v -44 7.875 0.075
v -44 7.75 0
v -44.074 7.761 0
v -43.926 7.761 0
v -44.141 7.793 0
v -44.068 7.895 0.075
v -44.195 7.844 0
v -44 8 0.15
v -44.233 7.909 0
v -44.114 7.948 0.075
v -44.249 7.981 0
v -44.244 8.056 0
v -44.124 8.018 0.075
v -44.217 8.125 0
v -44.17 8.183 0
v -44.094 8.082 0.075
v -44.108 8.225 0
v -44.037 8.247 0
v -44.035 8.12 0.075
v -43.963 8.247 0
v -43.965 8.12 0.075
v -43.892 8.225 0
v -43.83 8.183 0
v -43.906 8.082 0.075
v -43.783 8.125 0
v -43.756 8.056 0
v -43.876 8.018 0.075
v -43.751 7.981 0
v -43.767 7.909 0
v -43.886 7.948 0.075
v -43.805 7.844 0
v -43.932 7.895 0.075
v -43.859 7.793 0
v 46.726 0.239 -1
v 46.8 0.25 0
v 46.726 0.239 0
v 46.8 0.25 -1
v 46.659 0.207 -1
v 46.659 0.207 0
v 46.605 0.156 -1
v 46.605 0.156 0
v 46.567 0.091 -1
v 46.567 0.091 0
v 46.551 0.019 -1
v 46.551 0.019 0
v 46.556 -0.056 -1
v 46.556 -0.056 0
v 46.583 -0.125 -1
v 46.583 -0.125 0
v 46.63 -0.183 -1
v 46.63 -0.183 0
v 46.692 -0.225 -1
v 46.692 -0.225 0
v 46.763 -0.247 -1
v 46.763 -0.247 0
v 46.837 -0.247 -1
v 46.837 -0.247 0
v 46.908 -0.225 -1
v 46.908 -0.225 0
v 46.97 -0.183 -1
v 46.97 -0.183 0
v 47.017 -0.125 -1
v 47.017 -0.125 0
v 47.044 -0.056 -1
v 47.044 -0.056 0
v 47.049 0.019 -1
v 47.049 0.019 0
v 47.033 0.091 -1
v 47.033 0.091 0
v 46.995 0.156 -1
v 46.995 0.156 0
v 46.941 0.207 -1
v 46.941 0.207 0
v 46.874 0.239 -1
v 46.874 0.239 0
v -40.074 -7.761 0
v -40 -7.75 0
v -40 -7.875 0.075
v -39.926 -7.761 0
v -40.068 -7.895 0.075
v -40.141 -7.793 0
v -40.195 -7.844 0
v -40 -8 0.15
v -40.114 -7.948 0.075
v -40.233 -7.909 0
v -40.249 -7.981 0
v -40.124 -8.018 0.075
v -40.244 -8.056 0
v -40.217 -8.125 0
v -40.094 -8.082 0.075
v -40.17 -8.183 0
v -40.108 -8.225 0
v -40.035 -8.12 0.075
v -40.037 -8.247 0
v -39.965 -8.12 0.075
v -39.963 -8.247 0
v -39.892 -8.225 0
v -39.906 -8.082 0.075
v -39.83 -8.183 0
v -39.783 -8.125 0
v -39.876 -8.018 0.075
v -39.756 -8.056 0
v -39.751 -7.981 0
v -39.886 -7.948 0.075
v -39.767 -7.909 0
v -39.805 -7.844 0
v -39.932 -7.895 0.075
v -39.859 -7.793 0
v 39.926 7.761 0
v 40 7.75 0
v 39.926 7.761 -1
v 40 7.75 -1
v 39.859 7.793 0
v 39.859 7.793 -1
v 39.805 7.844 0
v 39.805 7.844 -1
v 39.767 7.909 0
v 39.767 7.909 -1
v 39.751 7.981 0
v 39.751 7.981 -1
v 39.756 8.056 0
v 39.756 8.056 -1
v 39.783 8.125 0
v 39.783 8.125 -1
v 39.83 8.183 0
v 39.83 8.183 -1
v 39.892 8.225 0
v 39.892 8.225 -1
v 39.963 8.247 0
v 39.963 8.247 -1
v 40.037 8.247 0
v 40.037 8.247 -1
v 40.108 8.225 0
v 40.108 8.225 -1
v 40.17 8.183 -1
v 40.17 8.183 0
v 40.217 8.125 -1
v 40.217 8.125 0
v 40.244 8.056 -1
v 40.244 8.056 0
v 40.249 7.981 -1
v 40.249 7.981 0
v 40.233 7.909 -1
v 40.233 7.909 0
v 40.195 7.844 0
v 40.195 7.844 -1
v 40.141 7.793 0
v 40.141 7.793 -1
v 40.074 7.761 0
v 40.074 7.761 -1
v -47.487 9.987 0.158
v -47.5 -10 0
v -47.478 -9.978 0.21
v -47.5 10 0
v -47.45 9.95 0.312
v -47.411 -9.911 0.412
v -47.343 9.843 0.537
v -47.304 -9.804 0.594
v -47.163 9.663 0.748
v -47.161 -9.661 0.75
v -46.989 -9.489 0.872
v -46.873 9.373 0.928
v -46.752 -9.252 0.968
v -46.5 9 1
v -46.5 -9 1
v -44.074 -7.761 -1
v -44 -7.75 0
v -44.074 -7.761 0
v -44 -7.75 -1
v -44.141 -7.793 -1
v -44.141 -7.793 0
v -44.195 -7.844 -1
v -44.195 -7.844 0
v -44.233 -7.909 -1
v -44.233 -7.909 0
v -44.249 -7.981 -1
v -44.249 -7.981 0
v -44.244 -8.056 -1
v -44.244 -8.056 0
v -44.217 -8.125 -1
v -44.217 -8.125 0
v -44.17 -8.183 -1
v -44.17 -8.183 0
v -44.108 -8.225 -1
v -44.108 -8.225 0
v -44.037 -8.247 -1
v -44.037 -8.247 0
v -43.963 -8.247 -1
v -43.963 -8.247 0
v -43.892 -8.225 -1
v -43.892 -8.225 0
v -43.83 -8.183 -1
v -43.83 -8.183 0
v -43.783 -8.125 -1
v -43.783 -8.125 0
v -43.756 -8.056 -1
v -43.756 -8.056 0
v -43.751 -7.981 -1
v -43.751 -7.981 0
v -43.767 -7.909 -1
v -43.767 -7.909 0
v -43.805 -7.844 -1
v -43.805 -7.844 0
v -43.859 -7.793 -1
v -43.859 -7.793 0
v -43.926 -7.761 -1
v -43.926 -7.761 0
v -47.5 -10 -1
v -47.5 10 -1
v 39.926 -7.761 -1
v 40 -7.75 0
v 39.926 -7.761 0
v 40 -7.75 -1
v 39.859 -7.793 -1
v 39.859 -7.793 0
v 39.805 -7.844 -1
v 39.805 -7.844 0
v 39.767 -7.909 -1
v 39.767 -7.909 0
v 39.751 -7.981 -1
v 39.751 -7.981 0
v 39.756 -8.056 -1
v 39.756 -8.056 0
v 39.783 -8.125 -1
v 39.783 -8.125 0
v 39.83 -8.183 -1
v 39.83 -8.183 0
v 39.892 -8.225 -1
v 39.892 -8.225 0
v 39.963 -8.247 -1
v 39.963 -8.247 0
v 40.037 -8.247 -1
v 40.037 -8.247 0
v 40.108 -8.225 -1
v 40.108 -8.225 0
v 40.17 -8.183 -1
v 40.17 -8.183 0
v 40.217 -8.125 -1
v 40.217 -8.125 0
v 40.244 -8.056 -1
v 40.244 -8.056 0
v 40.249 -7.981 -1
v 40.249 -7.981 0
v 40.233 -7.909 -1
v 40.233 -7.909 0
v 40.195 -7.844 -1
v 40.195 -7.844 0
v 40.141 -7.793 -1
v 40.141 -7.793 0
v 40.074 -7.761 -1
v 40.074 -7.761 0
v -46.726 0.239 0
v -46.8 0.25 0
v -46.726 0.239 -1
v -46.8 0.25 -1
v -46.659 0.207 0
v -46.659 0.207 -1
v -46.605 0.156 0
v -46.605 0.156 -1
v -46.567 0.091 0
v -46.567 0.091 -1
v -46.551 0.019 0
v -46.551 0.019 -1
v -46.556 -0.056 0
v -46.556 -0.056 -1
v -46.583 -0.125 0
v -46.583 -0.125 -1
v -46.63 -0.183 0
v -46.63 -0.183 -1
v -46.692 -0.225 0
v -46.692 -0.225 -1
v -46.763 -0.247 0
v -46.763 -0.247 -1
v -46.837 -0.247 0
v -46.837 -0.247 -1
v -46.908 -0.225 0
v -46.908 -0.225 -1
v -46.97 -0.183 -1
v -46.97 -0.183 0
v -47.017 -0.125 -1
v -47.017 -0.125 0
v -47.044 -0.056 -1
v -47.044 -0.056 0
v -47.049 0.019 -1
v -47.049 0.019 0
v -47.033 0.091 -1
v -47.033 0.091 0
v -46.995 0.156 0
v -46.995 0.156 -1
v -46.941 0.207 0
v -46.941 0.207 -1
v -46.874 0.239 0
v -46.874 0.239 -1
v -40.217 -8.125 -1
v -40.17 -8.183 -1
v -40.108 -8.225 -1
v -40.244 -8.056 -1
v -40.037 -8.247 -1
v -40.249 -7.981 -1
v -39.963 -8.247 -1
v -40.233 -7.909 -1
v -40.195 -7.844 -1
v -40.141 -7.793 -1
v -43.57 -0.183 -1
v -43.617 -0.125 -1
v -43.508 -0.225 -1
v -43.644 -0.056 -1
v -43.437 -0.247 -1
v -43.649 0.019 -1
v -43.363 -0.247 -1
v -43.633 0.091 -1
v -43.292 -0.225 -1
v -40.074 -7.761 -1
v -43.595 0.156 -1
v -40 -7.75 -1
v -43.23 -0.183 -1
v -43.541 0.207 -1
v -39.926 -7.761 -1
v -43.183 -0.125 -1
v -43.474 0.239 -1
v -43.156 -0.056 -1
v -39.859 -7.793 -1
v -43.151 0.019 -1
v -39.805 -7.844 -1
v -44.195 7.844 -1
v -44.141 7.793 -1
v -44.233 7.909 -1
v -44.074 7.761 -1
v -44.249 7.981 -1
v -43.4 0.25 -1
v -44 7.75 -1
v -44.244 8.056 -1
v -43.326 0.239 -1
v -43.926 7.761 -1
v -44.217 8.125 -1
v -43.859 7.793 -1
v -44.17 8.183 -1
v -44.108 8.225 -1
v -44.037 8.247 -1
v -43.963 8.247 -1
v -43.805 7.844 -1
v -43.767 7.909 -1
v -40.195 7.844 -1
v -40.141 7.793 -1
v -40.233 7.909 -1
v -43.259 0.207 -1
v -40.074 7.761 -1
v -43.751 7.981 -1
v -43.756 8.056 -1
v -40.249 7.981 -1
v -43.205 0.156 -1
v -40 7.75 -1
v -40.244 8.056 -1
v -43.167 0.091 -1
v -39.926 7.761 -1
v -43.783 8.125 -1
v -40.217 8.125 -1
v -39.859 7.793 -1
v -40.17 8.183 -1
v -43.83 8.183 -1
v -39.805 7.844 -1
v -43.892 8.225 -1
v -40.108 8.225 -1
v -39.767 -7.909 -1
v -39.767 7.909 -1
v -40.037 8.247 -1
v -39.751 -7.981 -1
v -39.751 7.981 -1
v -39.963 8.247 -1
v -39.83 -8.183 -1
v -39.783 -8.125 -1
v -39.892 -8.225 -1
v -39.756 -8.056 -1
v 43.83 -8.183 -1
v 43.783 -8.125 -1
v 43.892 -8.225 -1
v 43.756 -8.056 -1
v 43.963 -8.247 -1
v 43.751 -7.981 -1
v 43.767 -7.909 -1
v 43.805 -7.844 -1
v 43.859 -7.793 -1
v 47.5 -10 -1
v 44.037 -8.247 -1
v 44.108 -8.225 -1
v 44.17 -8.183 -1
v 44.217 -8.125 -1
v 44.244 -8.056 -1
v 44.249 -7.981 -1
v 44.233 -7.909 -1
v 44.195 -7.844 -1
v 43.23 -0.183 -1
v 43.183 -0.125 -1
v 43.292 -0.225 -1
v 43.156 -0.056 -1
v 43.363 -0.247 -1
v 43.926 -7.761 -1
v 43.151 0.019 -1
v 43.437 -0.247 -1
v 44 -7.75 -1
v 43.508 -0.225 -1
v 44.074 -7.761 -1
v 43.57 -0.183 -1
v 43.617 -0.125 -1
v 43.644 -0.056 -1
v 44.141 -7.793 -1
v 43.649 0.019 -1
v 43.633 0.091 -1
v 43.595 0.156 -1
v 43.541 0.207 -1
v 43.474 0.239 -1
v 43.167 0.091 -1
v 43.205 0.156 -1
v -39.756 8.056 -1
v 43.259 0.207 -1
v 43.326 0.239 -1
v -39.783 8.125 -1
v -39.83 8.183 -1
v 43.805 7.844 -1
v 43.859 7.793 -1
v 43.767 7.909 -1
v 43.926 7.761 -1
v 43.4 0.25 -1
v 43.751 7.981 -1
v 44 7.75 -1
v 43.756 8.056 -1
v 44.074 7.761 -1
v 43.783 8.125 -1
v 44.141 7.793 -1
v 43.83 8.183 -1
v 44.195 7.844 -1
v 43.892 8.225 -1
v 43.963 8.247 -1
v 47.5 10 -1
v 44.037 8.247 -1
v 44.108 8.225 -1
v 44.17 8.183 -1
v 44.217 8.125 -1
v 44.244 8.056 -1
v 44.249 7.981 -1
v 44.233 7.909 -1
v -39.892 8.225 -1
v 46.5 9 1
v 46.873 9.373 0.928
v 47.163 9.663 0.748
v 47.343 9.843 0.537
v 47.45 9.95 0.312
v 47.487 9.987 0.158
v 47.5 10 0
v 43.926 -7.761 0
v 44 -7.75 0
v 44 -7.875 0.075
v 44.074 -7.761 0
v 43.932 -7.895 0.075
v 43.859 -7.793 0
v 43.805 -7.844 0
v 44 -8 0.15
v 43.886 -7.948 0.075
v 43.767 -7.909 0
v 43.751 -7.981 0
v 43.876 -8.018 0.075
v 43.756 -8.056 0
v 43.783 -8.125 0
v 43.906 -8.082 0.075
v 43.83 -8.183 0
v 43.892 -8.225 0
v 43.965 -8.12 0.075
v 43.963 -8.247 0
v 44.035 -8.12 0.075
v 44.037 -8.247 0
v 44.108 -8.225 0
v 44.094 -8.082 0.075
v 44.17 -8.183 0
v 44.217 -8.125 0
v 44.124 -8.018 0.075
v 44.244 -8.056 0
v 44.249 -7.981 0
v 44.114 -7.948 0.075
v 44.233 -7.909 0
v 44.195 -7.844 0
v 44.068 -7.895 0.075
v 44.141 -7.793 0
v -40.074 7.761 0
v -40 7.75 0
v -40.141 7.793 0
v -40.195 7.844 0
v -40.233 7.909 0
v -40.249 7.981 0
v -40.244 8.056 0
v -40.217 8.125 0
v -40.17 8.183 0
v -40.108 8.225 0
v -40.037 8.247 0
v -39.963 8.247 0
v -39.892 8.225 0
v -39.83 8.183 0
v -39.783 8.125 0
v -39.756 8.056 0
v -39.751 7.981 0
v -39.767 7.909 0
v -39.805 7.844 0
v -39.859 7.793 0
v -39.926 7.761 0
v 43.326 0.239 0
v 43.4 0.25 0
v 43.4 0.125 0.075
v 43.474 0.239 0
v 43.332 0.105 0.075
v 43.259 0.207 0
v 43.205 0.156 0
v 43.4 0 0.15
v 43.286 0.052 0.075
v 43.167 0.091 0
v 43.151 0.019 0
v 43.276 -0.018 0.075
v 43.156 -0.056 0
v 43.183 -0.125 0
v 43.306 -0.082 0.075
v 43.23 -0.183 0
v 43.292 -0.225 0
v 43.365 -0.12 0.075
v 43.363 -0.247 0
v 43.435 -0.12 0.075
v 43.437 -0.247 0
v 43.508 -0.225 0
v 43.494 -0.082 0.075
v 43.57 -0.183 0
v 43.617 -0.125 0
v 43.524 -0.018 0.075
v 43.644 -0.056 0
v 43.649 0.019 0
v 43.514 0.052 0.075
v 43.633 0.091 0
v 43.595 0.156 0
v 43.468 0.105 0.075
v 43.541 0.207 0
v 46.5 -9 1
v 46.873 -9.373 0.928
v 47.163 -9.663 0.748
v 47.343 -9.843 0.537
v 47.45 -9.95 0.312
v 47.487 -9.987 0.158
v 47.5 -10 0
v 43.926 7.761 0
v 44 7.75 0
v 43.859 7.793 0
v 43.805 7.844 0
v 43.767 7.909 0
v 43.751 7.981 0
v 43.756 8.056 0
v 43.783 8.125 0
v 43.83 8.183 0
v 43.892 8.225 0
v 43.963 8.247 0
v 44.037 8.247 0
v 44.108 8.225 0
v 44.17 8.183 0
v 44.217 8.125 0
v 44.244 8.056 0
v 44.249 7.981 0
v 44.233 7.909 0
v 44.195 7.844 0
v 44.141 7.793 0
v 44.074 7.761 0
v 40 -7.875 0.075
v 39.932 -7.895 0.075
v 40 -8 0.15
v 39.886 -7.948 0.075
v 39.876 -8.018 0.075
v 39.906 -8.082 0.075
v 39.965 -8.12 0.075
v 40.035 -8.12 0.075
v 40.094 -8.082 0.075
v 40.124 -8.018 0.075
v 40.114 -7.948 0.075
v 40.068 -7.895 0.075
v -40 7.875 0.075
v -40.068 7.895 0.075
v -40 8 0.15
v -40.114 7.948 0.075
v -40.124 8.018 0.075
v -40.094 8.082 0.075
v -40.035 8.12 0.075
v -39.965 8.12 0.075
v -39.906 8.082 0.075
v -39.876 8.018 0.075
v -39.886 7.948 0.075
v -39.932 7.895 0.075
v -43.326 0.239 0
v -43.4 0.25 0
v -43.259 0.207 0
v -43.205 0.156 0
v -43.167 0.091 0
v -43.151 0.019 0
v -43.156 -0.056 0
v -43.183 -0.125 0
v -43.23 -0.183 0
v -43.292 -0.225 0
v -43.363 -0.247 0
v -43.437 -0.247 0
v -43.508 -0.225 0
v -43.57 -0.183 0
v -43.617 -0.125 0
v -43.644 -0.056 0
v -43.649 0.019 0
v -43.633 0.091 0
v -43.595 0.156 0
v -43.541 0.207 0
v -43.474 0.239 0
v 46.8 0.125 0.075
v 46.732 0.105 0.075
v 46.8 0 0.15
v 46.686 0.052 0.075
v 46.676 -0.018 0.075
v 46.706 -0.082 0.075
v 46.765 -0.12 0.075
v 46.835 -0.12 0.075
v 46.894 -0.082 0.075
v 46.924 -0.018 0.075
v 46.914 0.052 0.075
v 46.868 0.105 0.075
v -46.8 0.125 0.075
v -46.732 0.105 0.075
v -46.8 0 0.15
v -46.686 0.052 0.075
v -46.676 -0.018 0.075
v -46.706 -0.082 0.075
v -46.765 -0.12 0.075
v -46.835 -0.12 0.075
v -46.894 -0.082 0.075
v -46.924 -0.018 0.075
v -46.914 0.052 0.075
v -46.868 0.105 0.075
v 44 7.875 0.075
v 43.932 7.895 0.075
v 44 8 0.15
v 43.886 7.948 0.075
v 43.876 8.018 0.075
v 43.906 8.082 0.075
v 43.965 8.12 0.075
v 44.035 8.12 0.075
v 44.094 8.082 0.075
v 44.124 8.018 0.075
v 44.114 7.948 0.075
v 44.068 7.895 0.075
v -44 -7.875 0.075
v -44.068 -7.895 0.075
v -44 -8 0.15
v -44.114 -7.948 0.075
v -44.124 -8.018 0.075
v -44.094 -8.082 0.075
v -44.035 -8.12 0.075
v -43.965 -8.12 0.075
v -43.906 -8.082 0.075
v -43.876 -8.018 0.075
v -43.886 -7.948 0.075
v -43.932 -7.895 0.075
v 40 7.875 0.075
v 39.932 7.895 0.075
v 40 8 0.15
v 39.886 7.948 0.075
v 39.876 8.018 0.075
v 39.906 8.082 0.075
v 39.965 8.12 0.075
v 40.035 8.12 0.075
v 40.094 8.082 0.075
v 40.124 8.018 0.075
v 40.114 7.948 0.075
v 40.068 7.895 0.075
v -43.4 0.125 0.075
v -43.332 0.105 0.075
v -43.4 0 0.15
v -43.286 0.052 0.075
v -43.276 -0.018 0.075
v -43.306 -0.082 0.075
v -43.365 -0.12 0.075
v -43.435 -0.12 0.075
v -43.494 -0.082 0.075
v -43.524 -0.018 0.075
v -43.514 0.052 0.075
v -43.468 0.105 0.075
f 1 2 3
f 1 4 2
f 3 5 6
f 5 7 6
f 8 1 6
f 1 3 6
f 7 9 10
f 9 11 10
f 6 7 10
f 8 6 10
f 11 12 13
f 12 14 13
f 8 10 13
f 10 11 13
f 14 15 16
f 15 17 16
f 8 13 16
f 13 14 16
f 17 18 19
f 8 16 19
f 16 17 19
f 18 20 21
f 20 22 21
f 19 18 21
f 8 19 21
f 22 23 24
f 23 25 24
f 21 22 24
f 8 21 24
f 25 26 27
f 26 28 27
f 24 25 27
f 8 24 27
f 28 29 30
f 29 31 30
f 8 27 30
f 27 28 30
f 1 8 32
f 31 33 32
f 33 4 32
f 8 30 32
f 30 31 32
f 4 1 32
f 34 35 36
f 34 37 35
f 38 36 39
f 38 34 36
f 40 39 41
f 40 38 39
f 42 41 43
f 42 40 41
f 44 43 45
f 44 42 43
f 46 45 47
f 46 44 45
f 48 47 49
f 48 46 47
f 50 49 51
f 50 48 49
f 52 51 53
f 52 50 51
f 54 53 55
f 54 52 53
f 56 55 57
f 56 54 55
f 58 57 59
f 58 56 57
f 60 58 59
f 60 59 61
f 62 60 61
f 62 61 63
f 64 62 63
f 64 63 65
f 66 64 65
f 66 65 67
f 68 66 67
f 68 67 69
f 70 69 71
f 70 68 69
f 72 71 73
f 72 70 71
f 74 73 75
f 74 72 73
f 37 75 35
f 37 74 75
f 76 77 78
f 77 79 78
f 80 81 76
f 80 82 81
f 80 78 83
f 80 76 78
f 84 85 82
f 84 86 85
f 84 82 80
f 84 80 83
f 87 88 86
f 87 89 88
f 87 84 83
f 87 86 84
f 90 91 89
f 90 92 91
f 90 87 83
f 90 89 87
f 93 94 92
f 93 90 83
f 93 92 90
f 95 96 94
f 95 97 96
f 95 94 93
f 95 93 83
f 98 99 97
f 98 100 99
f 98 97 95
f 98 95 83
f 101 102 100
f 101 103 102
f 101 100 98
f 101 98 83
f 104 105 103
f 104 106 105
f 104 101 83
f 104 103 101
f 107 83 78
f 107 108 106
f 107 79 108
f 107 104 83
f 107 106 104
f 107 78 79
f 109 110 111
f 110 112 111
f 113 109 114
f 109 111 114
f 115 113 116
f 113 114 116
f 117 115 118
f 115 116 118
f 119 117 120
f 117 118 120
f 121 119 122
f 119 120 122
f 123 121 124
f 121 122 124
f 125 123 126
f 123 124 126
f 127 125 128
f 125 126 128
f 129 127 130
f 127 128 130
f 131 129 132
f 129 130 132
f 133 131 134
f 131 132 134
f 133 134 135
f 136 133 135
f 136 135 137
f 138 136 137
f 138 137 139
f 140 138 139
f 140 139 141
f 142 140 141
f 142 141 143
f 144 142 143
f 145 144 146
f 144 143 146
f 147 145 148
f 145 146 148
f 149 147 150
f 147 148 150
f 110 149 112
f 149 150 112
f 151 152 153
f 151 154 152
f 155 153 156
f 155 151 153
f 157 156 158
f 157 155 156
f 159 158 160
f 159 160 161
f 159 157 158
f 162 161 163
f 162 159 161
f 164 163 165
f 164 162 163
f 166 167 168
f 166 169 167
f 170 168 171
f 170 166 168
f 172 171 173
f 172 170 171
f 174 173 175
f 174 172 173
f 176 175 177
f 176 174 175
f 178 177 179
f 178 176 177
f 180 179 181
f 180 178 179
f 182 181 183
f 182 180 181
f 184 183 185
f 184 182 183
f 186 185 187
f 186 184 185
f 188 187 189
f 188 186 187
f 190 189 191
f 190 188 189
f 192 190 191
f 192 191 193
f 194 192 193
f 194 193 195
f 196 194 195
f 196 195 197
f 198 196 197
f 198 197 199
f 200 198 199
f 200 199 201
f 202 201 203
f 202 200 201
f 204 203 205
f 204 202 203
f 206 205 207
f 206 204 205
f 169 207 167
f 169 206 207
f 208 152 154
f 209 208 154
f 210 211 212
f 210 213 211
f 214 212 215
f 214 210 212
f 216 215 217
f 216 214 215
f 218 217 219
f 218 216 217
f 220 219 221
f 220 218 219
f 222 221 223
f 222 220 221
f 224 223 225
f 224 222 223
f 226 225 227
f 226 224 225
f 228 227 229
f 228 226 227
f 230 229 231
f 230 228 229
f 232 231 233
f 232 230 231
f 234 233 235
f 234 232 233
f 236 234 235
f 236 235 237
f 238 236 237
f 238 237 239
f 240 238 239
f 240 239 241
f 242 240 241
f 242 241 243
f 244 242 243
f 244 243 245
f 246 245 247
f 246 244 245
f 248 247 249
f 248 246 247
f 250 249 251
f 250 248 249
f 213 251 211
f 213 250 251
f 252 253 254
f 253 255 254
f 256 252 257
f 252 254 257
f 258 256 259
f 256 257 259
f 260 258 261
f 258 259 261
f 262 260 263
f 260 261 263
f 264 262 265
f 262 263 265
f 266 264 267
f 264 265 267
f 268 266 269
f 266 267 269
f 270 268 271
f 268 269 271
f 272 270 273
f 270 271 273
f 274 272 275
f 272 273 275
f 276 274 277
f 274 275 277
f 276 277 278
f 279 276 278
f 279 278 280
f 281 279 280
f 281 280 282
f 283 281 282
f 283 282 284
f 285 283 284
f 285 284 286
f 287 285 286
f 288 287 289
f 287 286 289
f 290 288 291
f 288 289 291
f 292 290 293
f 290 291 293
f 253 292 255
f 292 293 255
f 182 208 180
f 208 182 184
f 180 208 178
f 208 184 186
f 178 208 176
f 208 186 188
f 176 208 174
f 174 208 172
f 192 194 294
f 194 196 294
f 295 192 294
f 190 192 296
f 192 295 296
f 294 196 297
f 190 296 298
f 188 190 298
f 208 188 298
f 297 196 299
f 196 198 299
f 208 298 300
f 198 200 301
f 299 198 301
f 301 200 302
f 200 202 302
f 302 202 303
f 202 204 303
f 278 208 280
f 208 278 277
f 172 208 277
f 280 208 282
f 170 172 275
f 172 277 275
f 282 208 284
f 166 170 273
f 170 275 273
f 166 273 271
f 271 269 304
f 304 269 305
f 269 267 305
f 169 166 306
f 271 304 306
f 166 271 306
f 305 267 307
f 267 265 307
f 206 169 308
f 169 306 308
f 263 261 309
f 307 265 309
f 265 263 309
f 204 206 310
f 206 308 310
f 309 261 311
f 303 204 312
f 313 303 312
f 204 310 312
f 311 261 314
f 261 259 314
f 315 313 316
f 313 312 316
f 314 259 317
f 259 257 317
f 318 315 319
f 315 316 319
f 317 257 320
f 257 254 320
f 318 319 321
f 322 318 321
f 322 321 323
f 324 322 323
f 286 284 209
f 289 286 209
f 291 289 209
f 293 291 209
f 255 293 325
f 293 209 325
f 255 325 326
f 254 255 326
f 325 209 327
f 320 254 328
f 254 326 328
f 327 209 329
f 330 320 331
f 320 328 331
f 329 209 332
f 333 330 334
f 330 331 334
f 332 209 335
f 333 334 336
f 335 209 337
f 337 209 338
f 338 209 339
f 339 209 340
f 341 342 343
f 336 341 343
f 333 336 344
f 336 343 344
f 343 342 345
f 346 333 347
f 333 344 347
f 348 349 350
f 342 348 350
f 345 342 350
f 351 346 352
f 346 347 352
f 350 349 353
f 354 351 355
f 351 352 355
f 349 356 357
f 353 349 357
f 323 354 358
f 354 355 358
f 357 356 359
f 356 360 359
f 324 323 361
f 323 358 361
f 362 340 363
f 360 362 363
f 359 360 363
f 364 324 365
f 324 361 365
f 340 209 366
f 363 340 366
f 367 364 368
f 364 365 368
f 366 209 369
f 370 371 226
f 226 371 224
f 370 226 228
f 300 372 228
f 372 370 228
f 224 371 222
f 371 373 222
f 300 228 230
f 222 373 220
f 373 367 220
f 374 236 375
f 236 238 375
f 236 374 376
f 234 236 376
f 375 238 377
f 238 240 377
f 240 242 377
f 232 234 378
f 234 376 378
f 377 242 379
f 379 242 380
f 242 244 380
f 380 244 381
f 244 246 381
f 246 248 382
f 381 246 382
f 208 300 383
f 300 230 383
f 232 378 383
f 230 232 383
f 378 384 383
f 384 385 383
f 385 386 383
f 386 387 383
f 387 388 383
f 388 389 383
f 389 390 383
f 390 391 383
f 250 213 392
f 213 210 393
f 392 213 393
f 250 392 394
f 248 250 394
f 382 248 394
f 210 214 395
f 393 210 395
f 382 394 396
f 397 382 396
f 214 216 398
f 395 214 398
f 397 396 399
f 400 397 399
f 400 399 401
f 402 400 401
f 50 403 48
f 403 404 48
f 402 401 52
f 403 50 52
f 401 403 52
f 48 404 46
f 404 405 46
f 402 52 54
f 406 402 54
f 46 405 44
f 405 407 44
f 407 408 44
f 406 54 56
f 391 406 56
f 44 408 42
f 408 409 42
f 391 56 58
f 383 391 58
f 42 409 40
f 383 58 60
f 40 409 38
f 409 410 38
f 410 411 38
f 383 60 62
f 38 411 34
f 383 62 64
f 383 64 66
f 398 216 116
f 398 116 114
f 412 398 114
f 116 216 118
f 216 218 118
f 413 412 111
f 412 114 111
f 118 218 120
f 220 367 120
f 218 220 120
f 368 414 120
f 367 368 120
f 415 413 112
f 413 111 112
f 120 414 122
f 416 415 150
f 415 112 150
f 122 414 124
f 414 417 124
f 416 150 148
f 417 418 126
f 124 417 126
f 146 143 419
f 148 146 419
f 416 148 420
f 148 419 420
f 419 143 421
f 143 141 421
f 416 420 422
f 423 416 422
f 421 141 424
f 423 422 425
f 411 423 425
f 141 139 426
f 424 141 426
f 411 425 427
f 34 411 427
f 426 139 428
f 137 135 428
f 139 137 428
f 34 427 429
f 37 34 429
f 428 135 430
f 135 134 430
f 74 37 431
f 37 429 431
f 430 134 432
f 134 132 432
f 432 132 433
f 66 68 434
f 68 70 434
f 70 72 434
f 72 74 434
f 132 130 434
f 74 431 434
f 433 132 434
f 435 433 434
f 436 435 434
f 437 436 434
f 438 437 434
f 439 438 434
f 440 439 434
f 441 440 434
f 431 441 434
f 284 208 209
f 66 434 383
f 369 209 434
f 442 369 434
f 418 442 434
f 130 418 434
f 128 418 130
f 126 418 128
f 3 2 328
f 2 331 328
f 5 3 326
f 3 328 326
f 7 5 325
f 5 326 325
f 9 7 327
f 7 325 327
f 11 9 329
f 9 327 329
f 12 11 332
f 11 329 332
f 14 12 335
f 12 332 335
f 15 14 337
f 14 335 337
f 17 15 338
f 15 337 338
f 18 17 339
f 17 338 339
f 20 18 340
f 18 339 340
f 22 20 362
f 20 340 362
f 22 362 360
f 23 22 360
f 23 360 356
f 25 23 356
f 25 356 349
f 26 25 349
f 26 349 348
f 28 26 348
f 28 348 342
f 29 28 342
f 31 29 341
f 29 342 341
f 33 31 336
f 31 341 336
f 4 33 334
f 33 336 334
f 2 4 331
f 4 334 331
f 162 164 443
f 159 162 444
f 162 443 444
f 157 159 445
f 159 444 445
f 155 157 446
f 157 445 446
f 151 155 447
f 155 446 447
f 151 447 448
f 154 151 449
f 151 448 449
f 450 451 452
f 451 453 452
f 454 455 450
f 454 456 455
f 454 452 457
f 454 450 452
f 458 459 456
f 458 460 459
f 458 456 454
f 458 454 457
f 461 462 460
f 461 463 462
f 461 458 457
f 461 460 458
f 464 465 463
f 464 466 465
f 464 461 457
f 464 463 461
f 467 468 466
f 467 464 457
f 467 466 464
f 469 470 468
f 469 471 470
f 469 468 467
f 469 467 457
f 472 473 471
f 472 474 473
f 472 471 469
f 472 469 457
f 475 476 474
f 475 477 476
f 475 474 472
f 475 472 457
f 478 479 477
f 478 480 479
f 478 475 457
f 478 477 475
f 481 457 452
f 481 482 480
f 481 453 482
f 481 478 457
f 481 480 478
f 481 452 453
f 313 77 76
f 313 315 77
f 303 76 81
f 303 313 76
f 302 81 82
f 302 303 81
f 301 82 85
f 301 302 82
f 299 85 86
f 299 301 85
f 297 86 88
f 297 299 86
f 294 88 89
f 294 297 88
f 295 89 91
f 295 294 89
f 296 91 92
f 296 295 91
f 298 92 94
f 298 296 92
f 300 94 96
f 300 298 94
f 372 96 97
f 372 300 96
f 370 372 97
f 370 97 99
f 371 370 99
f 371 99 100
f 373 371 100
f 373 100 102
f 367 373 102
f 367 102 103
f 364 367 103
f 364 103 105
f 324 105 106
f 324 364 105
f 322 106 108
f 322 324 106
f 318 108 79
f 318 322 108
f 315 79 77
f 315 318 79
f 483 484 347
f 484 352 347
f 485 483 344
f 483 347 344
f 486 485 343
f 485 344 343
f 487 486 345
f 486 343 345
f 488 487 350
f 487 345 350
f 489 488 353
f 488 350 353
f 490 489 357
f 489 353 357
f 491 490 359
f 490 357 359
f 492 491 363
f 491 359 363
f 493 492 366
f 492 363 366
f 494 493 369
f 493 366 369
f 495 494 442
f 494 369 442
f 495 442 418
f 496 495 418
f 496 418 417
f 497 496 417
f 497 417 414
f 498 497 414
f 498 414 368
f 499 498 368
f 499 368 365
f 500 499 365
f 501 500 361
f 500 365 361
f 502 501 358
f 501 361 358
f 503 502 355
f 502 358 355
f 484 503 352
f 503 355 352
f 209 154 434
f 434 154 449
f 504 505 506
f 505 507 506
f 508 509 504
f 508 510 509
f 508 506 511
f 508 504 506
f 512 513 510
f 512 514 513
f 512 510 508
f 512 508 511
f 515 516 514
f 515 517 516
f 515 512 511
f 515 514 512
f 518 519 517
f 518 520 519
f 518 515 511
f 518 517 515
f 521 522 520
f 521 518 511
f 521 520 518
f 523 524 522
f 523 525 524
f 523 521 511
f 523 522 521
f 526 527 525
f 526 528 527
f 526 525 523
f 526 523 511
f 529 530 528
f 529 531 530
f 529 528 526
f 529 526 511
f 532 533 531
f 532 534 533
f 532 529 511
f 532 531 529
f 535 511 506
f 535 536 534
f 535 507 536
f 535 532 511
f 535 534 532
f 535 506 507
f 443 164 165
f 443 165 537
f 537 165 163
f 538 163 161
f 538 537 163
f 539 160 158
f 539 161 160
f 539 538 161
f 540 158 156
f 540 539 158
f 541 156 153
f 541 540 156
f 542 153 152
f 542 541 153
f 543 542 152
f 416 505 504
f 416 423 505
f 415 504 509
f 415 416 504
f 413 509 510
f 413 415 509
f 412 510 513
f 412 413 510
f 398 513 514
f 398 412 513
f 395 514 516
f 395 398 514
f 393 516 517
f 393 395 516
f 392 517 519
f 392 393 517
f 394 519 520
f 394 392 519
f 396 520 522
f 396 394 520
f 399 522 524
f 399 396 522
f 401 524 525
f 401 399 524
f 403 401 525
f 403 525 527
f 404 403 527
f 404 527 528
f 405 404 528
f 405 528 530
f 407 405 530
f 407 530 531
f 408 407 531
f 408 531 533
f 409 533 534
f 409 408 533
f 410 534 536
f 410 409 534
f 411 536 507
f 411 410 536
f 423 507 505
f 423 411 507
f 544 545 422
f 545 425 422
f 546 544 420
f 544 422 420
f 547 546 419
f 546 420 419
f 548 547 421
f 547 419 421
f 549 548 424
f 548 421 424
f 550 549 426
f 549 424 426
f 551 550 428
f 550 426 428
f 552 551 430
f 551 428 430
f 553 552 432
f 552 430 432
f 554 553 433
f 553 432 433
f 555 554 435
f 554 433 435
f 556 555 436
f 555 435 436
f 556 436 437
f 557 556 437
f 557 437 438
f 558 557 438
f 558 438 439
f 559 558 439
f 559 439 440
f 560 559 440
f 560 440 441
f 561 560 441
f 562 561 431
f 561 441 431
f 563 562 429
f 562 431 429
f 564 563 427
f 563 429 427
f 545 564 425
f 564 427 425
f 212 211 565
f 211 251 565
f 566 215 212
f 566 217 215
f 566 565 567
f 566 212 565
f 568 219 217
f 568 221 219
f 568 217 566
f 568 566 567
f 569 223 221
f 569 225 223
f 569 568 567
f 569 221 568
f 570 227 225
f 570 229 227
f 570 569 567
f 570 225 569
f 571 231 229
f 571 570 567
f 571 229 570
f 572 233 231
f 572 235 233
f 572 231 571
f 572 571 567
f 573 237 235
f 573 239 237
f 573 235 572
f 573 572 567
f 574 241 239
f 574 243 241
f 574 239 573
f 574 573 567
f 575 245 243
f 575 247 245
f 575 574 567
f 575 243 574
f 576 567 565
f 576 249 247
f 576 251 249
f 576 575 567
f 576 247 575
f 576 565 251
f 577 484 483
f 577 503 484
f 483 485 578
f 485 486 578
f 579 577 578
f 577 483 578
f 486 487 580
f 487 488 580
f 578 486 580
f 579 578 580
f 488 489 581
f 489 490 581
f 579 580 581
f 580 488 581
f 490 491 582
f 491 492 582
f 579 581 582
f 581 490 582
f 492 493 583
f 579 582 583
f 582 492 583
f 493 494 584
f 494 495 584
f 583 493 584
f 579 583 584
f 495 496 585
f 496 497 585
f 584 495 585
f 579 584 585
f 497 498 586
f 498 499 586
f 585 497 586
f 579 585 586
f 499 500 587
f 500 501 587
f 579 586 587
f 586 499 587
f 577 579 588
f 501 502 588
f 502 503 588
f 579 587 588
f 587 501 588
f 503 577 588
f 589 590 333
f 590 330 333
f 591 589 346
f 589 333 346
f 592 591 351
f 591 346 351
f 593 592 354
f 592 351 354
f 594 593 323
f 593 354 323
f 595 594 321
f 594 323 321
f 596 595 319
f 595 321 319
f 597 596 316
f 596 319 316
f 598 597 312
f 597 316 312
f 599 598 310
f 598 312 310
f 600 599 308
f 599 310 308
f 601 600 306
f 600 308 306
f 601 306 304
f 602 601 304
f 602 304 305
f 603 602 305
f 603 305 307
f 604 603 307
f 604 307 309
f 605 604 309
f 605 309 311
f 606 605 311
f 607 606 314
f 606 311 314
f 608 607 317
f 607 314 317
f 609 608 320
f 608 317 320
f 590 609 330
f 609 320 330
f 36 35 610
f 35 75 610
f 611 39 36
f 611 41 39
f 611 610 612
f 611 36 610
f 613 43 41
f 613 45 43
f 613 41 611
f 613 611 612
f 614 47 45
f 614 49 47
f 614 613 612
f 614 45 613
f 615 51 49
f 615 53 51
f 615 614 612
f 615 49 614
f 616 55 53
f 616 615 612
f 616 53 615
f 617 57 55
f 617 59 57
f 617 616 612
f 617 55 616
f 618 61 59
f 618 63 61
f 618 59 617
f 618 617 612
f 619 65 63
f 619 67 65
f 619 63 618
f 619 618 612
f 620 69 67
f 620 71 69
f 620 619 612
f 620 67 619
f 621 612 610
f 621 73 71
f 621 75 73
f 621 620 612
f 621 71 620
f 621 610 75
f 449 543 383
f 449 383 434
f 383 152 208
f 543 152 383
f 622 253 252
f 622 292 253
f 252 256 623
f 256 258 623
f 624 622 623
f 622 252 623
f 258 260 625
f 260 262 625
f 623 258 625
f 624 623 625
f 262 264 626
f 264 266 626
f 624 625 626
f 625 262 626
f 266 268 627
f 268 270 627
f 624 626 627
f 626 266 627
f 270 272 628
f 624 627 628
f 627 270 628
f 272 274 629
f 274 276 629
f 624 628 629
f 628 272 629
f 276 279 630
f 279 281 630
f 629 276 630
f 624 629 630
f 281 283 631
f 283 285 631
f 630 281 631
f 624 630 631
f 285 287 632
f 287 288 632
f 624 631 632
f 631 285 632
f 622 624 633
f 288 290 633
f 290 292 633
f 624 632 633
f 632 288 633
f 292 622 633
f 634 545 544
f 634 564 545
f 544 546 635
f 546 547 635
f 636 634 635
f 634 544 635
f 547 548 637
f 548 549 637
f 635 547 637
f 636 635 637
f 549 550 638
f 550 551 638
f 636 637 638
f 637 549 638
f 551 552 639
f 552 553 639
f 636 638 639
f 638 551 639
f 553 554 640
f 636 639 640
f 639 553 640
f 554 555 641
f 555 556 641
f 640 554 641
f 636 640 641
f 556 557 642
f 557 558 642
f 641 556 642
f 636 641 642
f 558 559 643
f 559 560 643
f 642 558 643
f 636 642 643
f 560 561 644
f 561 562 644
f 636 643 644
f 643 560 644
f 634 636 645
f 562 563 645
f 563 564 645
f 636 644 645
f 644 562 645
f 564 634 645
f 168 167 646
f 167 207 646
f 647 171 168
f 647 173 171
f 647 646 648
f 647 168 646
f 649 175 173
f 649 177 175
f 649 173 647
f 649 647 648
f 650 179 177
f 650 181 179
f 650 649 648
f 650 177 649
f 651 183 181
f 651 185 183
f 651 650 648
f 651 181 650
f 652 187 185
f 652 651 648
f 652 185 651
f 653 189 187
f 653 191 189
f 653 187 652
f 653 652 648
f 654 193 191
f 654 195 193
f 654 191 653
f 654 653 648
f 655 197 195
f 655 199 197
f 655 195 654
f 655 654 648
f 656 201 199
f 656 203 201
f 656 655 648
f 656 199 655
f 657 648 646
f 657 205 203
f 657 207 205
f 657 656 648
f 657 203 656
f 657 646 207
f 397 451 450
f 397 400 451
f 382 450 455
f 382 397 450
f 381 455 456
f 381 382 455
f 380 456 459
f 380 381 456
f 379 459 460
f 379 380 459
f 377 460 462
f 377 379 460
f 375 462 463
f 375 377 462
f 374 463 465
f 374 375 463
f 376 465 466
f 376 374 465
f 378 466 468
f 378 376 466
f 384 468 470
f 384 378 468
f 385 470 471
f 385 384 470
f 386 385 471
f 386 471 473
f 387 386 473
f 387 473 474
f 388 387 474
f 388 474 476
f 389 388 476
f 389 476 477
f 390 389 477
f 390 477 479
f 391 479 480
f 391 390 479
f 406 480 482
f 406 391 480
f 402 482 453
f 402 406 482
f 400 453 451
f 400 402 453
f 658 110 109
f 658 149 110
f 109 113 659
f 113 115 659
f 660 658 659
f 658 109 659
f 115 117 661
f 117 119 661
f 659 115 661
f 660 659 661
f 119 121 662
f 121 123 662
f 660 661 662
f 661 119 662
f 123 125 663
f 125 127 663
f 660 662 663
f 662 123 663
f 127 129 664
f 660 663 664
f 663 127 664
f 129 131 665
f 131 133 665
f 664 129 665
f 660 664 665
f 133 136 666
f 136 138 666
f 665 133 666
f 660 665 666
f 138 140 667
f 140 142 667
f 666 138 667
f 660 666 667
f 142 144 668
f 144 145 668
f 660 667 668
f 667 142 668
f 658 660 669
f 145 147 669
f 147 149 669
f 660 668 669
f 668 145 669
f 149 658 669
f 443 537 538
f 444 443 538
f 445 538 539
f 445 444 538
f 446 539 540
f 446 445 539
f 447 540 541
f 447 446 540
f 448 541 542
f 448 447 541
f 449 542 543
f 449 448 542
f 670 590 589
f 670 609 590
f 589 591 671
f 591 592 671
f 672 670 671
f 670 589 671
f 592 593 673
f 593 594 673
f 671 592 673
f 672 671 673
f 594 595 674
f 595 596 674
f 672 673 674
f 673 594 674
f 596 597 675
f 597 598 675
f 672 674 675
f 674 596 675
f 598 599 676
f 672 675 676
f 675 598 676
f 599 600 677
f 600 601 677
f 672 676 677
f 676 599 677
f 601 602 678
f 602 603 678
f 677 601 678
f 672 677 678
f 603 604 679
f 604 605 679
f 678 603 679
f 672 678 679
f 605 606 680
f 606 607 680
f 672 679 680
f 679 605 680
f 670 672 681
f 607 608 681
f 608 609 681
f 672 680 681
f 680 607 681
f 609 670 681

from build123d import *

# Parameters (mm, degrees)
SKETCH1_W                      = 95
SKETCH1_H                      = 20
BOSS_EXTRUDE1_DEPTH            = 1
FILLET1_R                      = 1
F_1_0MM_DOWEL_HOLE1_AT_2_COUNT = 2
F_1_0MM_DOWEL_HOLE1_AT_2_PITCH = 4
F_1_0MM_DOWEL_HOLE1_AT_3_COUNT = 2
F_1_0MM_DOWEL_HOLE1_AT_3_PITCH = 84
F_1_0MM_DOWEL_HOLE1_AT_4_COUNT = 2
F_1_0MM_DOWEL_HOLE1_AT_4_PITCH = 88
F_1_0MM_DOWEL_HOLE2_AT_2_COUNT = 2
F_1_0MM_DOWEL_HOLE2_AT_2_PITCH = 3.4


with BuildPart() as part:
    # Sketch1 → Boss-Extrude1 (new, symmetric)
    with BuildSketch(Plane.XY):
        Rectangle(SKETCH1_W, SKETCH1_H)
    extrude(amount=BOSS_EXTRUDE1_DEPTH, both=True)

    # Fillet1
    fillet1_edges = [part.edges().sort_by_distance(p)[0] for p in [
        (47.5, 0, 1),
        (0, 10, 1),
        (-47.5, 0, 1),
        (0, -10, 1),
    ]]
    fillet(fillet1_edges, radius=FILLET1_R)

    # Sketch3 → Ø1.0mm Dowel Hole1 (revolve, cut)
    with BuildSketch(Plane(origin=(44, -8, -1), x_dir=(0, 1, 0), z_dir=(1, 0, 0))):
        Polygon((0, 0), (0, 1.150215155), (0.25, 1), (0.25, 0), align=None)
    f_1_0mm_dowel_hole1 = revolve(axis=Axis((44, -8, -7.35), (0, 0, 1)), mode=Mode.SUBTRACT)

    # Ø1.0mm Dowel Hole1 at 2: Ø1.0mm Dowel Hole1 ×2
    with Locations(*[(-i * F_1_0MM_DOWEL_HOLE1_AT_2_PITCH, 0, 0) for i in range(1, F_1_0MM_DOWEL_HOLE1_AT_2_COUNT)]):
        add(f_1_0mm_dowel_hole1, mode=Mode.SUBTRACT)

    # Ø1.0mm Dowel Hole1 at 3: Ø1.0mm Dowel Hole1 ×2
    with Locations(*[(-i * F_1_0MM_DOWEL_HOLE1_AT_3_PITCH, 0, 0) for i in range(1, F_1_0MM_DOWEL_HOLE1_AT_3_COUNT)]):
        add(f_1_0mm_dowel_hole1, mode=Mode.SUBTRACT)

    # Ø1.0mm Dowel Hole1 at 4: Ø1.0mm Dowel Hole1 ×2
    with Locations(*[(-i * F_1_0MM_DOWEL_HOLE1_AT_4_PITCH, 0, 0) for i in range(1, F_1_0MM_DOWEL_HOLE1_AT_4_COUNT)]):
        add(f_1_0mm_dowel_hole1, mode=Mode.SUBTRACT)

    # Mirror1: Ø1.0mm Dowel Hole1 across plane
    add(f_1_0mm_dowel_hole1.mirror(Plane.ZX), mode=Mode.SUBTRACT)

    # Mirror1 copy 1 sketch → Mirror1 copy 1 (revolve, cut)
    with BuildSketch(Plane(origin=(40, 8, -1), x_dir=(0, -1, 0), z_dir=(1, 0, 0))):
        Polygon((0, 0), (0, -1.150215155), (0.25, -1), (0.25, 0), align=None)
    revolve(axis=Axis((40, 8, -7.35), (0, 0, -1)), mode=Mode.SUBTRACT)

    # Mirror1 copy 2 sketch → Mirror1 copy 2 (revolve, cut)
    with BuildSketch(Plane(origin=(-40, 8, -1), x_dir=(0, -1, 0), z_dir=(1, 0, 0))):
        Polygon((0, 0), (0, -1.150215155), (0.25, -1), (0.25, 0), align=None)
    revolve(axis=Axis((-40, 8, -7.35), (0, 0, -1)), mode=Mode.SUBTRACT)

    # Mirror1 copy 3 sketch → Mirror1 copy 3 (revolve, cut)
    with BuildSketch(Plane(origin=(-44, 8, -1), x_dir=(0, -1, 0), z_dir=(1, 0, 0))):
        Polygon((0, 0), (0, -1.150215155), (0.25, -1), (0.25, 0), align=None)
    revolve(axis=Axis((-44, 8, -7.35), (0, 0, -1)), mode=Mode.SUBTRACT)

    # Sketch5 → Ø1.0mm Dowel Hole2 (revolve, cut)
    with BuildSketch(Plane(origin=(46.8, 0, -1), x_dir=(0, 1, 0), z_dir=(1, 0, 0))):
        Polygon((0, 0), (0, 1.150215155), (0.25, 1), (0.25, 0), align=None)
    f_1_0mm_dowel_hole2 = revolve(axis=Axis((46.8, 0, -7.35), (0, 0, 1)), mode=Mode.SUBTRACT)

    # Ø1.0mm Dowel Hole2 at 2: Ø1.0mm Dowel Hole2 ×2
    with Locations(*[(-i * F_1_0MM_DOWEL_HOLE2_AT_2_PITCH, 0, 0) for i in range(1, F_1_0MM_DOWEL_HOLE2_AT_2_COUNT)]):
        add(f_1_0mm_dowel_hole2, mode=Mode.SUBTRACT)

    # Mirror2: Ø1.0mm Dowel Hole2 across plane
    add(f_1_0mm_dowel_hole2.mirror(Plane(origin=(0, 0, 0), x_dir=(0, 0, 1), z_dir=(1, 0, 0))), mode=Mode.SUBTRACT)

    # Mirror2 copy 1 sketch → Mirror2 copy 1 (revolve, cut)
    with BuildSketch(Plane(origin=(-43.4, 0, -1), x_dir=(0, 1, 0), z_dir=(-1, 0, 0))):
        Polygon((0, 0), (0, -1.150215155), (0.25, -1), (0.25, 0), align=None)
    revolve(axis=Axis((-43.4, 0, -7.35), (0, 0, -1)), mode=Mode.SUBTRACT)


solid = part.part
